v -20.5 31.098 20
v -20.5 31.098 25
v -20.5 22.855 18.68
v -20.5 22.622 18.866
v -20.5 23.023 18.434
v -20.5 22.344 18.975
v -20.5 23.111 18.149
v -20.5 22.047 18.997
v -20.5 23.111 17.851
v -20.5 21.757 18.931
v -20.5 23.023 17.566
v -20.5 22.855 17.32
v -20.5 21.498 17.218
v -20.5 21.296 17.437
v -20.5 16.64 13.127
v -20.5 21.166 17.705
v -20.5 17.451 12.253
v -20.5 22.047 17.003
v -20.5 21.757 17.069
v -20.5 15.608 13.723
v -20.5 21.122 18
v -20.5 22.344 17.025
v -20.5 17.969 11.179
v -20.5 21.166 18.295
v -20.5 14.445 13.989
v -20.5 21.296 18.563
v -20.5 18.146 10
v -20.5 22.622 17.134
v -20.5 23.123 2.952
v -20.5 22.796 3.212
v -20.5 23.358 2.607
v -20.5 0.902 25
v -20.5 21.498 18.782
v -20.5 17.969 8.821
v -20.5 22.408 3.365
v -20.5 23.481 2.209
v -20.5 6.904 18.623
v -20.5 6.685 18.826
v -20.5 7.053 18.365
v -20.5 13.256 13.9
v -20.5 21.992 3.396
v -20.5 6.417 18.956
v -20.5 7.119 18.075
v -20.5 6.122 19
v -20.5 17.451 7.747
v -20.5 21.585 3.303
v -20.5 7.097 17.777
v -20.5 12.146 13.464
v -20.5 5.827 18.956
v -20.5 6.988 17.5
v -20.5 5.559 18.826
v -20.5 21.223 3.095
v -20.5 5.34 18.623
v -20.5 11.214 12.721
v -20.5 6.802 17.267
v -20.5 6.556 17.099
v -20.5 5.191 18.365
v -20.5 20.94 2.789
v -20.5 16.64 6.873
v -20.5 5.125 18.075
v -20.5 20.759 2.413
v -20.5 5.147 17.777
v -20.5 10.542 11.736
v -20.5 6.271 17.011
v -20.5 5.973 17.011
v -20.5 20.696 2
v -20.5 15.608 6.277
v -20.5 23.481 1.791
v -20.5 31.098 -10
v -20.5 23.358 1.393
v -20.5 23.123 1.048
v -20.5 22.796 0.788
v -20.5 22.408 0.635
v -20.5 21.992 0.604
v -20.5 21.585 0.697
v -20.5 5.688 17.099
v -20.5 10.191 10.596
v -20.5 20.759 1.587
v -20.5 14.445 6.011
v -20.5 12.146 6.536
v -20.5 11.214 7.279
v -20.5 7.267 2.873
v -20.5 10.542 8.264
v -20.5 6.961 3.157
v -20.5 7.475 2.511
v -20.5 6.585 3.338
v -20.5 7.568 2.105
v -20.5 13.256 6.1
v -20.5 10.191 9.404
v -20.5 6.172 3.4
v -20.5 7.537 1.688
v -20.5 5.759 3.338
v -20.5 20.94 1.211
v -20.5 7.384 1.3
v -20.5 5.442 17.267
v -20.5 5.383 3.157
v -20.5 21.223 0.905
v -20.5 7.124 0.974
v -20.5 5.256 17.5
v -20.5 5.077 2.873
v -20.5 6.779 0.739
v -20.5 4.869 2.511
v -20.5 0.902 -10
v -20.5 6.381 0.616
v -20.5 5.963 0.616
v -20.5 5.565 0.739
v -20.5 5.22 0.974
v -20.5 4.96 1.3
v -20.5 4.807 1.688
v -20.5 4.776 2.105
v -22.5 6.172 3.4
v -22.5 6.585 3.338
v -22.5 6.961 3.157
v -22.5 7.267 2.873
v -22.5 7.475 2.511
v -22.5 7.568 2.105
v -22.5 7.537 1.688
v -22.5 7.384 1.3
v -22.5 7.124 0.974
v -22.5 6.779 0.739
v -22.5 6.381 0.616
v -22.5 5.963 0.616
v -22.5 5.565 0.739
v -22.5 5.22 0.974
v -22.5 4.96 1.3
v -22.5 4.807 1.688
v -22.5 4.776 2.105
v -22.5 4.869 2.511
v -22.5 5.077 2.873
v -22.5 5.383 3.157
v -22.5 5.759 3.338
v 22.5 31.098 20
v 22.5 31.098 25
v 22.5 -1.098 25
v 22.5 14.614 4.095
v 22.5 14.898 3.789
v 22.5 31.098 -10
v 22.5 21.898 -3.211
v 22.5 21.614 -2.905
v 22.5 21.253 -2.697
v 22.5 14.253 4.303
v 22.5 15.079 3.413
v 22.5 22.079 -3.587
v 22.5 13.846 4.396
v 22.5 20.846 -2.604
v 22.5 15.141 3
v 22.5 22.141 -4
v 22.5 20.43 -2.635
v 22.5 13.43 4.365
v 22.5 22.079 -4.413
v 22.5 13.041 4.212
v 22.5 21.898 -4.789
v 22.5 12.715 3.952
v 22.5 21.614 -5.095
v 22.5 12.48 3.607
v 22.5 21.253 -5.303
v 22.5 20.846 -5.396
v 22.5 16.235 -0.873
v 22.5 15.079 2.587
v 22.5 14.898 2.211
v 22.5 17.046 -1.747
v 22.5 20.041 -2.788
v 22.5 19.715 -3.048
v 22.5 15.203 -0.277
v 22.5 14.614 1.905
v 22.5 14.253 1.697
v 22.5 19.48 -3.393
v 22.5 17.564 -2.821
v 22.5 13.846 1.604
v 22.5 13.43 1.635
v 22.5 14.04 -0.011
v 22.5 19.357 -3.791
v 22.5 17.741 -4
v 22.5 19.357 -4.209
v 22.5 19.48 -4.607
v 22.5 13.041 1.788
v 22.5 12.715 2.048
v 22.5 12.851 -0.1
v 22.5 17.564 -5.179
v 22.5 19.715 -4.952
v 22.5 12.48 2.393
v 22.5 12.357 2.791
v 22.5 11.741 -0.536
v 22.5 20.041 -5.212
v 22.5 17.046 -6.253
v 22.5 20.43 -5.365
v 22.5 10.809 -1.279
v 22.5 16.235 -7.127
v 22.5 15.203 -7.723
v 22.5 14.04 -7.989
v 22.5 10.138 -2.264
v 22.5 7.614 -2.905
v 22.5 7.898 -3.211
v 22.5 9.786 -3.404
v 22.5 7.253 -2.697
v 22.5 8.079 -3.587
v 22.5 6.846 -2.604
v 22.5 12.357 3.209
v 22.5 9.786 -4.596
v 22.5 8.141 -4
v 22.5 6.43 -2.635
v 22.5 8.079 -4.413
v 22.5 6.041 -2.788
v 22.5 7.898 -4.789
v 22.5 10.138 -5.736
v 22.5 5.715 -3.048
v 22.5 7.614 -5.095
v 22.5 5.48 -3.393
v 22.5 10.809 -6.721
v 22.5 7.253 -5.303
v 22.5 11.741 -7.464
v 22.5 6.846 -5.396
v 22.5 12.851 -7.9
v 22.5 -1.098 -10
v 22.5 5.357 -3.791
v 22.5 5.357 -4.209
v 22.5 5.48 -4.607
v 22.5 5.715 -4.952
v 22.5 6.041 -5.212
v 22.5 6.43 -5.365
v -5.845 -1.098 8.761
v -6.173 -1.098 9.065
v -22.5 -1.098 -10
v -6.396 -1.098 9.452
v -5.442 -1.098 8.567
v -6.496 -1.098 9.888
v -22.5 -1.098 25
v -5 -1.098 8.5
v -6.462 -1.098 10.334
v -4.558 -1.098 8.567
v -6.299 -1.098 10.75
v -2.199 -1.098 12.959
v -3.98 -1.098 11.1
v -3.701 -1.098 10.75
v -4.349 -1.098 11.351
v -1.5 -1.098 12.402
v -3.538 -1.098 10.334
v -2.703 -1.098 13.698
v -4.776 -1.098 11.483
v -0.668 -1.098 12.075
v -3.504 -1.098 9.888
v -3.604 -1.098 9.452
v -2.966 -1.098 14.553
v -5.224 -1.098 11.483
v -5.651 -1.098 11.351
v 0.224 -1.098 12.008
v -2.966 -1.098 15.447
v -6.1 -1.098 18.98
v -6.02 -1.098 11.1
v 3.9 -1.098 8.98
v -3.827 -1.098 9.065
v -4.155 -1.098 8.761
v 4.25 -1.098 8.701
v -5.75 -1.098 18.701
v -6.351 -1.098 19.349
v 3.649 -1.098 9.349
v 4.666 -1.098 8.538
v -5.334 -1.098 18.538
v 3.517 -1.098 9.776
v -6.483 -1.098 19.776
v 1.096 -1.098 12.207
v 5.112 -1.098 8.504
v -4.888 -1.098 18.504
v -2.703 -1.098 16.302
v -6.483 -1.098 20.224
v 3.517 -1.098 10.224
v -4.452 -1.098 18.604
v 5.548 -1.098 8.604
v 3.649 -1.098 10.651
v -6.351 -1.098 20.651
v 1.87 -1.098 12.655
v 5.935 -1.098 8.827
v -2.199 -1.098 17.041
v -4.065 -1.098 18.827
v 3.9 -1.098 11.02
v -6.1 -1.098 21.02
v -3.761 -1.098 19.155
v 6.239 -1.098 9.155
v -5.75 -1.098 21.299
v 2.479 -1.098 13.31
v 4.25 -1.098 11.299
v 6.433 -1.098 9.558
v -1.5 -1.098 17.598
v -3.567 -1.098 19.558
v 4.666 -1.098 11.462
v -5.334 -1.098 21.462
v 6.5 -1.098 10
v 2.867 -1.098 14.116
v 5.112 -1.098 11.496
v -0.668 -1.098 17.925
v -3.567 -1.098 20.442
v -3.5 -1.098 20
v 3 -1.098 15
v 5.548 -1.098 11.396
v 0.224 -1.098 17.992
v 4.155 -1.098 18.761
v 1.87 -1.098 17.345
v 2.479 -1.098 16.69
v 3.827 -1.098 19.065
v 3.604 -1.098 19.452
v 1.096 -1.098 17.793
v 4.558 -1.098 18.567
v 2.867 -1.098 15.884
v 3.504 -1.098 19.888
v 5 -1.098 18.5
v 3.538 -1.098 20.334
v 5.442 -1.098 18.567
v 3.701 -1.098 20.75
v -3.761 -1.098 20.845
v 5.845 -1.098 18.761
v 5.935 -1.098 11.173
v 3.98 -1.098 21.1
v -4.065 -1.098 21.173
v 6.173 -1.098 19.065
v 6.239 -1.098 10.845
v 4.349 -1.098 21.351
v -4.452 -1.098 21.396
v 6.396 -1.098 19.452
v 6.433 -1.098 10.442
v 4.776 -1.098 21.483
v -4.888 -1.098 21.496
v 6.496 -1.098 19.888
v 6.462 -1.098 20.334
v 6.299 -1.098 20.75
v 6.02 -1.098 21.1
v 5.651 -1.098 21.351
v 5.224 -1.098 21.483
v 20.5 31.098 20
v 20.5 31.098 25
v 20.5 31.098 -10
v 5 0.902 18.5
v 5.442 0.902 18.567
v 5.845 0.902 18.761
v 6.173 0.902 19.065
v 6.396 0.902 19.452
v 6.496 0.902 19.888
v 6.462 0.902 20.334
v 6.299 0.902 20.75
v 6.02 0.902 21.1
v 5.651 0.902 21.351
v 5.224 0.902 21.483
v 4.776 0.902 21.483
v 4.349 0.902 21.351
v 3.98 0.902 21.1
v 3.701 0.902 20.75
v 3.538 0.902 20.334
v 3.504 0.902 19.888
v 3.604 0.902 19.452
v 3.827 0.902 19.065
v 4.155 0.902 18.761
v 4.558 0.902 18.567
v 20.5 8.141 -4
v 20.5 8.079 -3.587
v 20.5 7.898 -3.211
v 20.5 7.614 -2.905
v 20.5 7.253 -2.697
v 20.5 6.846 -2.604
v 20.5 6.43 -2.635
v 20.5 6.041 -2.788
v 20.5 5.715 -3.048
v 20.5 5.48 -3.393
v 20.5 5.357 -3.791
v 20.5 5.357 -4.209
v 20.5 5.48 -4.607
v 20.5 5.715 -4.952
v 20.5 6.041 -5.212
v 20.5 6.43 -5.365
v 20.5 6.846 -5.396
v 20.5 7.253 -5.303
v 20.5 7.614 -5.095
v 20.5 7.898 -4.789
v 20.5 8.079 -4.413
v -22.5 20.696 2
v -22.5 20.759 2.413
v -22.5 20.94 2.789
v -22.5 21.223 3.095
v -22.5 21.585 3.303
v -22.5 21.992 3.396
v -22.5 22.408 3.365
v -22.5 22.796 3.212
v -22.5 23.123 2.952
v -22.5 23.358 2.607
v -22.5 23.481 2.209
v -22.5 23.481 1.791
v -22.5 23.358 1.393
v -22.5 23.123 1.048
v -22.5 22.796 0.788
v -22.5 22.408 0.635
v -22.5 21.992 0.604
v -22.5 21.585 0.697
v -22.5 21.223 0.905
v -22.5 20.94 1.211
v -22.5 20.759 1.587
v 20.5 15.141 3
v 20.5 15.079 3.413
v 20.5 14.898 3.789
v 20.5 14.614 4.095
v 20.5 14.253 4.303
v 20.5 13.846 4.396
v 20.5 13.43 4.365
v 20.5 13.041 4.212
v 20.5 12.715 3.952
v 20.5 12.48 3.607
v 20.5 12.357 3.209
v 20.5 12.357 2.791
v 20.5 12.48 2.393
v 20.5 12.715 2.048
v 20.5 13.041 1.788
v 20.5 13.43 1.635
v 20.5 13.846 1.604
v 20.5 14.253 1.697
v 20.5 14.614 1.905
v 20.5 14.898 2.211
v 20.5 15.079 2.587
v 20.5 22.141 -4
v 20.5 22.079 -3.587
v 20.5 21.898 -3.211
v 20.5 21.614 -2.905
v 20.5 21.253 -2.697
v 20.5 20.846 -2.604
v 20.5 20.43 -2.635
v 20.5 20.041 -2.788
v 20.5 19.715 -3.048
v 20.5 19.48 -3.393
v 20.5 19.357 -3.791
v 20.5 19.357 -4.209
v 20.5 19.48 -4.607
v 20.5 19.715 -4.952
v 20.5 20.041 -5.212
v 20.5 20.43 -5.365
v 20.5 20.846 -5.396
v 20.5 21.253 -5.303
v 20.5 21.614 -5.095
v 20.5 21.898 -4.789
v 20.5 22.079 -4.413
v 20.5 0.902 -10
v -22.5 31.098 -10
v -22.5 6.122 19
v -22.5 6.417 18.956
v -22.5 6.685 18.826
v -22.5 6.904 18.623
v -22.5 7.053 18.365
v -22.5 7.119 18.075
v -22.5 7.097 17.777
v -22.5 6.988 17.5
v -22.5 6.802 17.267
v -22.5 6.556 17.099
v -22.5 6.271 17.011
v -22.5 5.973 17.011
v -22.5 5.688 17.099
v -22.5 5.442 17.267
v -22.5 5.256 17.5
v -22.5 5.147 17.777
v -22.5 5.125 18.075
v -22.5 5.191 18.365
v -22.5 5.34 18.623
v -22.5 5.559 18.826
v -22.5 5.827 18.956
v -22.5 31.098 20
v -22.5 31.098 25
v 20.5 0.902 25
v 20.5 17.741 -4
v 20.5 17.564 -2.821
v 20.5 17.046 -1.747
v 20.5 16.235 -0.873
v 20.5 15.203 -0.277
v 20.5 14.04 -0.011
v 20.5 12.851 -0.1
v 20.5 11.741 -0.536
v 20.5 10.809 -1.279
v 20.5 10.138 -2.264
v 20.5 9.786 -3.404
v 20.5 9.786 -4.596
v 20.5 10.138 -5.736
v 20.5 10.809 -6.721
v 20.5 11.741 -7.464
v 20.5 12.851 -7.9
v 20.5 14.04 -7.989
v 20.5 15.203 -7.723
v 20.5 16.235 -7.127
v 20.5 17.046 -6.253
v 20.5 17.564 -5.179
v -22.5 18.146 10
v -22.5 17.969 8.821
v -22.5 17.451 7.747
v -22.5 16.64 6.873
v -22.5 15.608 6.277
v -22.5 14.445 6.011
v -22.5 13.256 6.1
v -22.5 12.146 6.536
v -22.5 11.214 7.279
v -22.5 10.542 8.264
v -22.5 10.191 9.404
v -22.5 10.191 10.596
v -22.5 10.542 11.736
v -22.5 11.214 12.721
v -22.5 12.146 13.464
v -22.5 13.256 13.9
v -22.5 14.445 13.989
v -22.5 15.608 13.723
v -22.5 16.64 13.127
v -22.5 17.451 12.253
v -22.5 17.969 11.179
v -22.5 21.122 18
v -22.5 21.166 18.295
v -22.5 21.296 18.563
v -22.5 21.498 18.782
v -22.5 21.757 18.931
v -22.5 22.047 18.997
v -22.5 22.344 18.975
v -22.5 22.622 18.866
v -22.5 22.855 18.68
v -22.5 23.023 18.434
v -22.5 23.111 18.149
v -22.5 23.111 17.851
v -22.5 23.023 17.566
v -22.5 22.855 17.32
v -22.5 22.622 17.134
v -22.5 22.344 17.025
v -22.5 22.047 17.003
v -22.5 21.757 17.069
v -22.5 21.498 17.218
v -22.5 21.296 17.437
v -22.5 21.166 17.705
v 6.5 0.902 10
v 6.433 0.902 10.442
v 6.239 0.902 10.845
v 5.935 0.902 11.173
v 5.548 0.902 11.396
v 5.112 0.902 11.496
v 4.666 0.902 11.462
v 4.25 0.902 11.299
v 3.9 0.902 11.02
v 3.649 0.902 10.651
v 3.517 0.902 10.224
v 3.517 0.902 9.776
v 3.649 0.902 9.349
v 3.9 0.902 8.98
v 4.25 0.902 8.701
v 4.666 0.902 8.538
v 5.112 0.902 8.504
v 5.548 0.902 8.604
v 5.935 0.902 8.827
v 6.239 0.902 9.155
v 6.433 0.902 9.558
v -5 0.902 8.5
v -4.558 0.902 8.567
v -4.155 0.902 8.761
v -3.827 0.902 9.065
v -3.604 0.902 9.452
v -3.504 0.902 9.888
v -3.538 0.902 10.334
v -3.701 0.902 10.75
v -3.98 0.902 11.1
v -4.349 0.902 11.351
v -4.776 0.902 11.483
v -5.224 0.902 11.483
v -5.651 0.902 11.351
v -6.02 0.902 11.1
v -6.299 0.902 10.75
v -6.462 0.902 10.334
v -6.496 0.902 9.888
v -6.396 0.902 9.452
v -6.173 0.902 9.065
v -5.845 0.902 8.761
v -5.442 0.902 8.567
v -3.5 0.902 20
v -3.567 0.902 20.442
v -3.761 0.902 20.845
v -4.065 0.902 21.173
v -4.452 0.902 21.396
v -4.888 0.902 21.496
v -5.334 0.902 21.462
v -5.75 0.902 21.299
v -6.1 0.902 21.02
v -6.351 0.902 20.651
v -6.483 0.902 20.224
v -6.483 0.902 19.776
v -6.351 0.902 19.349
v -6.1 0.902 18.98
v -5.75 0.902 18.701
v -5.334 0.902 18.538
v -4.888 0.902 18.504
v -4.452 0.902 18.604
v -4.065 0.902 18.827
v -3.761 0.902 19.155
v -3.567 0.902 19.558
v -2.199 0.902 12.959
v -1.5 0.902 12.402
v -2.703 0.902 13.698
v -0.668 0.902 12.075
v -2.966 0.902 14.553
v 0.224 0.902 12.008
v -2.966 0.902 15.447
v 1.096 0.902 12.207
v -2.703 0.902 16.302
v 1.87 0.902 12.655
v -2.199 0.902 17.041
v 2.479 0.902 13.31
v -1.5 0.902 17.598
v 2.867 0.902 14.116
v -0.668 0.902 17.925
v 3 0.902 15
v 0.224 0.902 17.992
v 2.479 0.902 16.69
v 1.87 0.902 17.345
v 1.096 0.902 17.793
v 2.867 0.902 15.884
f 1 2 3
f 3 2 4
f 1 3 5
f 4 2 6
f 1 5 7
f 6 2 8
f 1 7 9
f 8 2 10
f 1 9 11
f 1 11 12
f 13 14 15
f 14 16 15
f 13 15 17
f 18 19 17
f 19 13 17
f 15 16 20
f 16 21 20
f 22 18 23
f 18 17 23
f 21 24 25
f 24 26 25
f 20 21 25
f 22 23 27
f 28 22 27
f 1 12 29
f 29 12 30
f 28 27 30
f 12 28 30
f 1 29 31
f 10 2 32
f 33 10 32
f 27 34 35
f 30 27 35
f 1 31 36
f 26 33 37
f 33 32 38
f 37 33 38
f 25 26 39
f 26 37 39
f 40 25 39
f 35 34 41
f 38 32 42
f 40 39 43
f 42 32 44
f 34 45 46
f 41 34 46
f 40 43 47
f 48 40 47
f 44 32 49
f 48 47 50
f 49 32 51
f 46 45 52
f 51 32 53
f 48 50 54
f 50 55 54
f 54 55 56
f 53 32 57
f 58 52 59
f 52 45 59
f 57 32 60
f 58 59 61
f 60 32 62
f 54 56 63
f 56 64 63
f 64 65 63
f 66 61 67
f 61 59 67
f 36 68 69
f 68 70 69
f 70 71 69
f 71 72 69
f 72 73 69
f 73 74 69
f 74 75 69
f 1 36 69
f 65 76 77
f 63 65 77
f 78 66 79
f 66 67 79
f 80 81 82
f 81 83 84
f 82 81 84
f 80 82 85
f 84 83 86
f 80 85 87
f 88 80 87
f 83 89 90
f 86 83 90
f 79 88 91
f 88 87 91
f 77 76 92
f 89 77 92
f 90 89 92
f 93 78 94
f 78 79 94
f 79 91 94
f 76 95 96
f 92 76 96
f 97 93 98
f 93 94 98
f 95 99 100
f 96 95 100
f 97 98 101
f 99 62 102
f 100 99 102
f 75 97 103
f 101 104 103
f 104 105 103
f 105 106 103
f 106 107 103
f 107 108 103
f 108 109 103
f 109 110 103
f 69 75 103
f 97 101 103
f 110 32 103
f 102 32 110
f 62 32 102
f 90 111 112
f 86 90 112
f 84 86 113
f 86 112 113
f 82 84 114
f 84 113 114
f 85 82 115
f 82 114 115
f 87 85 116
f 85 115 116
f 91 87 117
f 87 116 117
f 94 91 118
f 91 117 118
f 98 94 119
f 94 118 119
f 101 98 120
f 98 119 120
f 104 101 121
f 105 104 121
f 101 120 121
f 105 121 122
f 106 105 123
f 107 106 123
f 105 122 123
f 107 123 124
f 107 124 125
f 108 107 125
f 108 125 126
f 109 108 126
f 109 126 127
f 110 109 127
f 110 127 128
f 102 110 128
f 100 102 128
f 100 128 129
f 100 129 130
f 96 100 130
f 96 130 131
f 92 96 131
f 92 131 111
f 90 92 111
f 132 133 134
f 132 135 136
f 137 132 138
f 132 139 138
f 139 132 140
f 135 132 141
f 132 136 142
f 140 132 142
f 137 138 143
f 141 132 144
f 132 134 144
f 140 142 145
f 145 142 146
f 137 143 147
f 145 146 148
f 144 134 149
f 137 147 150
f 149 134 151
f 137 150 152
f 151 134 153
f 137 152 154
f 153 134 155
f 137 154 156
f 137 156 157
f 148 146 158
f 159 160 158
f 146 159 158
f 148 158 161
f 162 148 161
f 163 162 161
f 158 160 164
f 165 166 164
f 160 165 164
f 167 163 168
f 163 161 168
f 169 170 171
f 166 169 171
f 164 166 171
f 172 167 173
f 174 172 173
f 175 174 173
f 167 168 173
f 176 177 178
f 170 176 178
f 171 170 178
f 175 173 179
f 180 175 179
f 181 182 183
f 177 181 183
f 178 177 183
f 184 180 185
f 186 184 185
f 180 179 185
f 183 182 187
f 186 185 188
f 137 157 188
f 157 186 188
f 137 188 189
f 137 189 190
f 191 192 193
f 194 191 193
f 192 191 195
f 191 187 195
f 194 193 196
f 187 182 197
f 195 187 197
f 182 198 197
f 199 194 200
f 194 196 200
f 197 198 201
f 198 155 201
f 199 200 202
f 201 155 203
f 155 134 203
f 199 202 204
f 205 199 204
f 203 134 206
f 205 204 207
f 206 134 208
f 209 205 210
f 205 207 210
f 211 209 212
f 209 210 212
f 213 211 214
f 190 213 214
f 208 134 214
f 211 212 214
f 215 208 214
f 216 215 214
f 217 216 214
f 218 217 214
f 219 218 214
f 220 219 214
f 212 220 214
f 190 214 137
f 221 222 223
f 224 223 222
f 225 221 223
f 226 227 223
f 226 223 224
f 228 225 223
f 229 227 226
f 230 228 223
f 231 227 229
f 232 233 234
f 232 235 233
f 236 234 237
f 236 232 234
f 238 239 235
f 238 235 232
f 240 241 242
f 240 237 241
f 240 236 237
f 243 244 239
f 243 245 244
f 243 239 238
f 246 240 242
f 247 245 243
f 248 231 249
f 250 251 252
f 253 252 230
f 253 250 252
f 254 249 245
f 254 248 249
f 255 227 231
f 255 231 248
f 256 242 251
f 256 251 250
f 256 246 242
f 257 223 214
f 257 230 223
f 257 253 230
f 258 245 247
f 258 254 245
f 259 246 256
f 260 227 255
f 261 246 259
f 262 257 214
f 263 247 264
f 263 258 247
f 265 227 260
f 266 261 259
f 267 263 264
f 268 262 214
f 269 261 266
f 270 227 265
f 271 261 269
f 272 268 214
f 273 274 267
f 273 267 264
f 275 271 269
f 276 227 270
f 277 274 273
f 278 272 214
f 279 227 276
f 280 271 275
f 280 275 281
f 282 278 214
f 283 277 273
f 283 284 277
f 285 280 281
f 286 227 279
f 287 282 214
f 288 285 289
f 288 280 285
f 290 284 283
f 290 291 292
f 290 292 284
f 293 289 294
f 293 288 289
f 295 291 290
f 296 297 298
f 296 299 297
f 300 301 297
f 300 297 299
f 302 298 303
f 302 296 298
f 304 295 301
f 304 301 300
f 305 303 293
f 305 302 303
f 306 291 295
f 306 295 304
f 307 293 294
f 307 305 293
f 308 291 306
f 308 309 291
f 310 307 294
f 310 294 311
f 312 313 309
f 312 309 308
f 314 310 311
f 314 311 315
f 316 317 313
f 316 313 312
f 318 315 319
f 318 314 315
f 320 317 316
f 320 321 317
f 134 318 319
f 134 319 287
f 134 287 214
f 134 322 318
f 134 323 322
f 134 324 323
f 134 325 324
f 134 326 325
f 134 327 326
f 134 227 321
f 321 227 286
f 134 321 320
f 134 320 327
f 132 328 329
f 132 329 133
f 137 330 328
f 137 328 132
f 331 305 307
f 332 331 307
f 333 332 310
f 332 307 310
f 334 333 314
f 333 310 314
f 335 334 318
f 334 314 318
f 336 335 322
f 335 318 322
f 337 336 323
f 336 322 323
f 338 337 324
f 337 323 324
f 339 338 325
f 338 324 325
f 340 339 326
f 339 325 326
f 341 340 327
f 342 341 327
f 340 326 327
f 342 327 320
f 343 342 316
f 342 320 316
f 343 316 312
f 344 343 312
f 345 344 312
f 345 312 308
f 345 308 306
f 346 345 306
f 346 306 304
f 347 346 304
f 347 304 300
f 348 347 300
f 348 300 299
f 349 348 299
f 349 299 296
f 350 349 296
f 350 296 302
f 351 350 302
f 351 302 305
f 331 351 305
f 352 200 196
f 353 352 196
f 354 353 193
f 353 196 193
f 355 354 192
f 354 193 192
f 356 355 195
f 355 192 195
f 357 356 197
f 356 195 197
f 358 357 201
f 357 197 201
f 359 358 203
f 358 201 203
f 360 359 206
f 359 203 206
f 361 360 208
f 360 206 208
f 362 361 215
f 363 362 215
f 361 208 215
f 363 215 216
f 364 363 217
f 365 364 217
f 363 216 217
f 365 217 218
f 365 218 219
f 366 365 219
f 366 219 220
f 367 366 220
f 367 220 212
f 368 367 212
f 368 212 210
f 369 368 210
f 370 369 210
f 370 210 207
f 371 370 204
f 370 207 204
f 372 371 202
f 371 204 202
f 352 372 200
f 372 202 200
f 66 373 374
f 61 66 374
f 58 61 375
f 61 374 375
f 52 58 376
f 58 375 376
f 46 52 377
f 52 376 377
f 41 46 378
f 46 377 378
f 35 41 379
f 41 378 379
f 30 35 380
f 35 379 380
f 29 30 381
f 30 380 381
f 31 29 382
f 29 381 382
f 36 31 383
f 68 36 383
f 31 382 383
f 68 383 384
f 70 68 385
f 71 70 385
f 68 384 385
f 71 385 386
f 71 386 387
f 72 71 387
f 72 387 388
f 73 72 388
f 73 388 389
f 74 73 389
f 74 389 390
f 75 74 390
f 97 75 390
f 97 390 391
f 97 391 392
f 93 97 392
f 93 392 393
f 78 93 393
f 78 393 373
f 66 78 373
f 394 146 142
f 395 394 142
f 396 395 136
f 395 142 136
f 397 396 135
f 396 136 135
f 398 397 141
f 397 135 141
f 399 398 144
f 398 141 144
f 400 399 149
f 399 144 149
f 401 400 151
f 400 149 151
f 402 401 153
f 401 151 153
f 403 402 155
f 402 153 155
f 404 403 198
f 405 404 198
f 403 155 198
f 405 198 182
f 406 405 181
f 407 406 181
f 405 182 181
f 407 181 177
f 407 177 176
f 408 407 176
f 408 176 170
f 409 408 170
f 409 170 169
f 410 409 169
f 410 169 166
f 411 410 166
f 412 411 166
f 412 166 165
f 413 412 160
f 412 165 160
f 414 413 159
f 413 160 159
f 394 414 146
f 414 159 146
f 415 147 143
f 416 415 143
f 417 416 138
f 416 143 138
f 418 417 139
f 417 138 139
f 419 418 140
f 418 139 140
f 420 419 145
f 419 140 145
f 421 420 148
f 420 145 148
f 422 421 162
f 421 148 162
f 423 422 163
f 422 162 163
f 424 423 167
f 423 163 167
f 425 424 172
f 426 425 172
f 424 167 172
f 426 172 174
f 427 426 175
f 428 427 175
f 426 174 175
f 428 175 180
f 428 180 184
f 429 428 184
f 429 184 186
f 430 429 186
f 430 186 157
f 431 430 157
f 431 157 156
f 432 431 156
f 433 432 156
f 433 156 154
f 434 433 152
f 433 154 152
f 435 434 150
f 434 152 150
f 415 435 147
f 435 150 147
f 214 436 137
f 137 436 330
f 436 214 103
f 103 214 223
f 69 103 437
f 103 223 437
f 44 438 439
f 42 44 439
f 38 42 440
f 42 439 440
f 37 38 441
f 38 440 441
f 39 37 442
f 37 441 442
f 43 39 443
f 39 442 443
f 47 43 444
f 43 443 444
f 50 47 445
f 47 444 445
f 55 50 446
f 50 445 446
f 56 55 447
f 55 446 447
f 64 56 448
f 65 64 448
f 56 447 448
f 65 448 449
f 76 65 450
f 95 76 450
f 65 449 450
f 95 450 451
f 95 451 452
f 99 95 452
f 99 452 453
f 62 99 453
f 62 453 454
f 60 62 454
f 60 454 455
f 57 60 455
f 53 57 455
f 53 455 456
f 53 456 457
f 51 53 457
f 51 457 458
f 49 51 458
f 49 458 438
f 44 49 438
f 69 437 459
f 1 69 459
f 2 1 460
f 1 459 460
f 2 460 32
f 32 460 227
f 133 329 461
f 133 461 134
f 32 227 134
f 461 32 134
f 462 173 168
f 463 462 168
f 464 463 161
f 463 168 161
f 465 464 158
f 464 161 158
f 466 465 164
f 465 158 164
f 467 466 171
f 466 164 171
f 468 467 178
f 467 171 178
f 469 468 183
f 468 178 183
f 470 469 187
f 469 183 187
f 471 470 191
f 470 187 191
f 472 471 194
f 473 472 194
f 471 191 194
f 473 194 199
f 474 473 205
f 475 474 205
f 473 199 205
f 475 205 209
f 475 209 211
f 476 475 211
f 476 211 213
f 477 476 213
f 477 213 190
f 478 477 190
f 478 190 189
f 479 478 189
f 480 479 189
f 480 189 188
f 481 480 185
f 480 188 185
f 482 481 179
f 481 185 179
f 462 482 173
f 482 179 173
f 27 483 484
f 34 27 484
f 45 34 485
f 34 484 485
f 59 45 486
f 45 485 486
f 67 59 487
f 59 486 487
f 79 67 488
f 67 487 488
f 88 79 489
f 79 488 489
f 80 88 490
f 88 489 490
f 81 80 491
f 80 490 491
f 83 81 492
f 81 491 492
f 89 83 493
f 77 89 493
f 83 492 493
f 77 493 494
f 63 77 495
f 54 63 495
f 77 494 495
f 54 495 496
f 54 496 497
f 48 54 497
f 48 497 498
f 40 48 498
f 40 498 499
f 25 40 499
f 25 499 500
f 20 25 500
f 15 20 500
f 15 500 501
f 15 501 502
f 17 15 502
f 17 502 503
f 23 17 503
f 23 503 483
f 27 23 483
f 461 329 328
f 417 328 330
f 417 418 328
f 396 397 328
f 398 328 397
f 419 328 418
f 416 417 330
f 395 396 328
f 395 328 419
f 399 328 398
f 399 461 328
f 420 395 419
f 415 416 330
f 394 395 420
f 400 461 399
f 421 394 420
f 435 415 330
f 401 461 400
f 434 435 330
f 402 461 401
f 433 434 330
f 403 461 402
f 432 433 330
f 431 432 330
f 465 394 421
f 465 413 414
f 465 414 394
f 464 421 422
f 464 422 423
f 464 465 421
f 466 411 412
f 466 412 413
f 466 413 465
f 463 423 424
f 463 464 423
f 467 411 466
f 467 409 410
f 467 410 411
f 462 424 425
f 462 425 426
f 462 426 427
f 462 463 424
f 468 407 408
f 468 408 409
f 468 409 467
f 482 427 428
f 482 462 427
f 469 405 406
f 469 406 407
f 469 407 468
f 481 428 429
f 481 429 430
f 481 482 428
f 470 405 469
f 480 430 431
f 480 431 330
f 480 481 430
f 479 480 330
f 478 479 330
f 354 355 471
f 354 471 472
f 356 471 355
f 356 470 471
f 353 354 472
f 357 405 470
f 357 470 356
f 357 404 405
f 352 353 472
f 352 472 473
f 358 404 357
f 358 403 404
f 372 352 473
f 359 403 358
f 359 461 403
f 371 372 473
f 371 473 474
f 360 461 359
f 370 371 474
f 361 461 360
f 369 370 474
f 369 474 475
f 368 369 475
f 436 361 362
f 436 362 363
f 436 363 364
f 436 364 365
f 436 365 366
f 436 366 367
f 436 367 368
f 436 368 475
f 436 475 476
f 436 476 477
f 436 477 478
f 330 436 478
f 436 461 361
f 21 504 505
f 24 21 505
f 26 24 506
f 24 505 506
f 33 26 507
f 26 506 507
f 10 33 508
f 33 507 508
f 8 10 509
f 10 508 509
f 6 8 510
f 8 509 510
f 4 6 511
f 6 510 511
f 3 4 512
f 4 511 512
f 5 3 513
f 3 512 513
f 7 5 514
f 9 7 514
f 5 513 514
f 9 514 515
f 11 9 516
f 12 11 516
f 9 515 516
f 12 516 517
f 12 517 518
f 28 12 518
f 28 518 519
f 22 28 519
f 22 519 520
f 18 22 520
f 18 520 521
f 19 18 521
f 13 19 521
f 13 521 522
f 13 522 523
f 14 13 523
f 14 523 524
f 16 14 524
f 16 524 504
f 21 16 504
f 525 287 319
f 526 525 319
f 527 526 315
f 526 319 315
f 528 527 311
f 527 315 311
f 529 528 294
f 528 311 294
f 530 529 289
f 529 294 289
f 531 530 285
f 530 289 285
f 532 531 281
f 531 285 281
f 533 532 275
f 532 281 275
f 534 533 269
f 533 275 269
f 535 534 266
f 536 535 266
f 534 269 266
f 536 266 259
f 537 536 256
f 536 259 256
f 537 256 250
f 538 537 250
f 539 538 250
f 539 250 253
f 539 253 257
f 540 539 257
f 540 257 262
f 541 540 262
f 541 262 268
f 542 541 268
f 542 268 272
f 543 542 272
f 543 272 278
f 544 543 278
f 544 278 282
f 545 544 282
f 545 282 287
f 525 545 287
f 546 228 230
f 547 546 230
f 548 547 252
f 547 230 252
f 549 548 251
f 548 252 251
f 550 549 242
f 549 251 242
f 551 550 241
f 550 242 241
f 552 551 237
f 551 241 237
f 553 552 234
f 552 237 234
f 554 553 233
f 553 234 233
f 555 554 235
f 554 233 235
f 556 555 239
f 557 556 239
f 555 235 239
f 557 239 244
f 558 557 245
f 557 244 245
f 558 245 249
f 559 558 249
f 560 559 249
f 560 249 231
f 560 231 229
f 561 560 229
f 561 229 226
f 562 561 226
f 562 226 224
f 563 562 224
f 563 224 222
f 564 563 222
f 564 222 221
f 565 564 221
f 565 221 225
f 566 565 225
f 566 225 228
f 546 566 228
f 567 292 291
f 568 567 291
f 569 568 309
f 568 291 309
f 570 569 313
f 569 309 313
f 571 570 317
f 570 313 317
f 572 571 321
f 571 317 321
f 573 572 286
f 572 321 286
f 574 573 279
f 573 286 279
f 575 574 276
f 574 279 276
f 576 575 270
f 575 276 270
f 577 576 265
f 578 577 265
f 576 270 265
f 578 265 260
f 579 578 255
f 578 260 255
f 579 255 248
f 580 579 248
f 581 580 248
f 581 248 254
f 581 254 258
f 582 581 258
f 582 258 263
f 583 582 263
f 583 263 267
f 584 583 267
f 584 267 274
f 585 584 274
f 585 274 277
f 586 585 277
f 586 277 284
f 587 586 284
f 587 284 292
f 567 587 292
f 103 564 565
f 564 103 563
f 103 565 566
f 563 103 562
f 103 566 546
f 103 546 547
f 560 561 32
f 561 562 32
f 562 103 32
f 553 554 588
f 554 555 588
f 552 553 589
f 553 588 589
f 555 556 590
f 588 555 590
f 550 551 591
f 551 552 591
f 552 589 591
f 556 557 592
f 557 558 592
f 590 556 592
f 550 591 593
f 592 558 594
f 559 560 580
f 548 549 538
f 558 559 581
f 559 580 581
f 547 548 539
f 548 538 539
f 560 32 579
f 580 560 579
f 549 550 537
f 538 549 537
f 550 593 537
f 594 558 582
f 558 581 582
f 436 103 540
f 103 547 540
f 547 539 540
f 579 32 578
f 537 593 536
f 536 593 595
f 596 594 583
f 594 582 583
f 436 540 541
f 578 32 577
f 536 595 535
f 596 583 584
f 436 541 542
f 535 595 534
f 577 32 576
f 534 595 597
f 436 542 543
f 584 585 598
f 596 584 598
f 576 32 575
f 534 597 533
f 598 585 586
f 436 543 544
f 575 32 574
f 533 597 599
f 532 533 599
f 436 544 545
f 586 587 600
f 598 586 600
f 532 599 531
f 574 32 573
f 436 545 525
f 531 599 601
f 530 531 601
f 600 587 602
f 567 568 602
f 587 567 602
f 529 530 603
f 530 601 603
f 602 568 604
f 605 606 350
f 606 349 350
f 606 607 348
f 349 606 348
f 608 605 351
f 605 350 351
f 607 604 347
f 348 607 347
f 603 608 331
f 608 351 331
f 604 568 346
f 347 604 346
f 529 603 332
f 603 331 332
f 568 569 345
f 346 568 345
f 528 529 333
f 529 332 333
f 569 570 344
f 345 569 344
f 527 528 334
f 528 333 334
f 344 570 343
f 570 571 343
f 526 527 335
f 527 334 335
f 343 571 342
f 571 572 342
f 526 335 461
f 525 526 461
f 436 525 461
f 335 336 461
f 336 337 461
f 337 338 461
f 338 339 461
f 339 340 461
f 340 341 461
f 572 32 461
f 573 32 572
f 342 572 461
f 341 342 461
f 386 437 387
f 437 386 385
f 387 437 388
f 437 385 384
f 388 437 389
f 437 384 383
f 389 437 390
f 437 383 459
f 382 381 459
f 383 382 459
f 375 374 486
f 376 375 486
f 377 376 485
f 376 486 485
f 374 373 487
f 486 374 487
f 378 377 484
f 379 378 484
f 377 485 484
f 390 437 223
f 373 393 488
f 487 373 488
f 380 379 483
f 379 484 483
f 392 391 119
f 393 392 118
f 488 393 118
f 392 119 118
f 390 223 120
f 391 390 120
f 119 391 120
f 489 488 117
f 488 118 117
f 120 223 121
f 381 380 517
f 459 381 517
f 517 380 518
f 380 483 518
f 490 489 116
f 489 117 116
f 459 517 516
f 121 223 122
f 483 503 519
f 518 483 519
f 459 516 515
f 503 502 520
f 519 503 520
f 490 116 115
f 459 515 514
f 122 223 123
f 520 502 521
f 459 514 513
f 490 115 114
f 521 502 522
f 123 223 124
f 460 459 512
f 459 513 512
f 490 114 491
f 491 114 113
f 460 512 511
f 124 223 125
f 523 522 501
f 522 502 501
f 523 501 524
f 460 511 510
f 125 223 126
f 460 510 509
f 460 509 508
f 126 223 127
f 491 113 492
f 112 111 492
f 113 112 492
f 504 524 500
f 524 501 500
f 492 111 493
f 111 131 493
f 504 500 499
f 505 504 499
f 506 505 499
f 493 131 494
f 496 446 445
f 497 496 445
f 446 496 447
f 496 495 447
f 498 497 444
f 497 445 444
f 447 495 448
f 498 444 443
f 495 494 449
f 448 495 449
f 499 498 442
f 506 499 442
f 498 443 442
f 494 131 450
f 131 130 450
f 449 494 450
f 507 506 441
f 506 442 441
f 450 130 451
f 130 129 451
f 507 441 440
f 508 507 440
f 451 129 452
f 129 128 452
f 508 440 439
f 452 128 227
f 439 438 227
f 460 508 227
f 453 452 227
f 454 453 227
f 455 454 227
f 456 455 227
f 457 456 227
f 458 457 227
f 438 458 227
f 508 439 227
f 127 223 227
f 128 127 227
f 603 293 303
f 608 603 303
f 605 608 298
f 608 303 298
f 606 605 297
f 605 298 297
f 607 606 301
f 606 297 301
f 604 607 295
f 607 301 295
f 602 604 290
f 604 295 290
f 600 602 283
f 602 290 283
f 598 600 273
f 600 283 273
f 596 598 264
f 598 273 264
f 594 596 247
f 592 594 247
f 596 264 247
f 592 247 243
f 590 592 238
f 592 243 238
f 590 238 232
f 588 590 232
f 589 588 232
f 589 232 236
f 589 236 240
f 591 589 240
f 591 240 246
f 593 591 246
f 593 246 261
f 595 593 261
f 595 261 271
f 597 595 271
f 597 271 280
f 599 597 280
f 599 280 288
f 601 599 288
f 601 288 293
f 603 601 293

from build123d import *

# Parameters (mm, degrees)
EXTRUDE_1_DEPTH                 = 20
CUT_EXTRUDE_1_REACH             = 60.241
SKETCH_2_R                      = 4
CUT_EXTRUDE_1_DIRECTION_2_DEPTH = 59.241379608
CUT_EXTRUDE_2_REACH             = 60.241
SKETCH_3_R                      = 1.4
SKETCH_3_R_2                    = 1
SKETCH_7_W                      = 10
SKETCH_7_H                      = 32.195121952
EXTRUDE_2_DEPTH                 = 2
SKETCH_8_W                      = 43
SKETCH_8_H                      = 10
EXTRUDE_3_DEPTH                 = 2
SKETCH_9_W                      = 10
SKETCH_9_H                      = 30.195121952
EXTRUDE_4_DEPTH                 = 2
SKETCH_11_R                     = 1.4
SKETCH_11_R_2                   = 4
CUT_EXTRUDE_8_DEPTH             = 2
SKETCH_13_W                     = 45
SKETCH_13_H                     = 5
EXTRUDE_5_DEPTH                 = 2
SKETCH_14_W                     = 2
SKETCH_14_H                     = 5
EXTRUDE_6_DEPTH                 = 30.19512195
CUT_EXTRUDE_9_REACH             = 48.559
SKETCH_19_R                     = 1.5
SKETCH_19_R_2                   = 3


with BuildPart() as part:
    # 草图1 → 凸台-拉伸1 (new body)
    with BuildSketch(Plane.XY):
        Polygon((22.5, 1.097560976), (22.5, -1.097560976), (-22.5, -1.097560976), (-22.5, 1.097560976), (-22.5, 31.097560976), (-20.5, 31.097560976), (-20.5, 0.902439024), (20.5, 0.902439024), (20.5, 31.097560976), (22.5, 31.097560976), align=None)
    extrude(amount=EXTRUDE_1_DEPTH)

    # 草图2 → 切除-拉伸1 (cut, up to next)
    with BuildSketch(Plane.ZY.offset(22.5), mode=Mode.PRIVATE) as cut_extrude_1_sk1:
        with Locations(Location((10, 14.146341463, 0), (0, 0, 90))):
            Circle(SKETCH_2_R)
    cut_extrude_1_tool1 = extrude(cut_extrude_1_sk1.sketch, amount=-CUT_EXTRUDE_1_REACH, mode=Mode.PRIVATE) & part.part
    add(cut_extrude_1_tool1.solids().sort_by_distance((-22.5, 14.146341, 10))[0], mode=Mode.SUBTRACT)

    # 草图2 → 切除-拉伸1 direction 2 (cut)
    with BuildSketch(Plane.ZY.offset(22.5)):
        with Locations(Location((10, 14.146341463, 0), (0, 0, 90))):
            Circle(SKETCH_2_R)
    extrude(amount=CUT_EXTRUDE_1_DIRECTION_2_DEPTH, mode=Mode.SUBTRACT)

    # 草图3 → 切除-拉伸2 (cut, up to next)
    with BuildSketch(Plane.ZY.offset(22.5), mode=Mode.PRIVATE) as cut_extrude_2_sk1:
        with Locations(Location((2, 22.096341464, 0), (0, 0, 270))):
            Circle(SKETCH_3_R)
    cut_extrude_2_tool1 = extrude(cut_extrude_2_sk1.sketch, amount=-CUT_EXTRUDE_2_REACH, mode=Mode.PRIVATE) & part.part
    # 草图3 → 切除-拉伸2 (cut, up to next)
    with BuildSketch(Plane.ZY.offset(22.5), mode=Mode.PRIVATE) as cut_extrude_2_sk2:
        with Locations(Location((18, 22.12195122, 0), (0, 0, 270))):
            Circle(SKETCH_3_R_2)
    cut_extrude_2_tool2 = extrude(cut_extrude_2_sk2.sketch, amount=-CUT_EXTRUDE_2_REACH, mode=Mode.PRIVATE) & part.part
    # 草图3 → 切除-拉伸2 (cut, up to next)
    with BuildSketch(Plane.ZY.offset(22.5), mode=Mode.PRIVATE) as cut_extrude_2_sk3:
        with Locations((18, 6.12195122)):
            Circle(SKETCH_3_R_2)
    cut_extrude_2_tool3 = extrude(cut_extrude_2_sk3.sketch, amount=-CUT_EXTRUDE_2_REACH, mode=Mode.PRIVATE) & part.part
    # 草图3 → 切除-拉伸2 (cut, up to next)
    with BuildSketch(Plane.ZY.offset(22.5), mode=Mode.PRIVATE) as cut_extrude_2_sk4:
        with Locations((2, 6.171951224)):
            Circle(SKETCH_3_R)
    cut_extrude_2_tool4 = extrude(cut_extrude_2_sk4.sketch, amount=-CUT_EXTRUDE_2_REACH, mode=Mode.PRIVATE) & part.part
    add(cut_extrude_2_tool1.solids().sort_by_distance((-22.5, 22.096341, 2))[0], mode=Mode.SUBTRACT)
    add(cut_extrude_2_tool2.solids().sort_by_distance((-22.5, 22.121951, 18))[0], mode=Mode.SUBTRACT)
    add(cut_extrude_2_tool3.solids().sort_by_distance((-22.5, 6.121951, 18))[0], mode=Mode.SUBTRACT)
    add(cut_extrude_2_tool4.solids().sort_by_distance((-22.5, 6.171951, 2))[0], mode=Mode.SUBTRACT)

    # 草图7 → 凸台-拉伸2 (add)
    with BuildSketch(Plane(origin=(22.5, 0, 0), x_dir=(0, 0, -1), z_dir=(1, 0, 0))):
        with Locations((5, 15)):
            Rectangle(SKETCH_7_W, SKETCH_7_H)
    extrude(amount=-EXTRUDE_2_DEPTH)

    # 草图8 → 凸台-拉伸3 (add)
    with BuildSketch(Plane.XZ.offset(1.097560976)):
        with Locations((-1, -5)):
            Rectangle(SKETCH_8_W, SKETCH_8_H)
    extrude(amount=-EXTRUDE_3_DEPTH)

    # 草图9 → 凸台-拉伸4 (add)
    with BuildSketch(Plane.ZY.offset(22.5)):
        with Locations((-5, 16)):
            Rectangle(SKETCH_9_W, SKETCH_9_H)
    extrude(amount=-EXTRUDE_4_DEPTH)

    # 草图11 → 切除-拉伸8 (cut)
    with BuildSketch(Plane(origin=(22.5, 0, 0), x_dir=(0, 0, -1), z_dir=(1, 0, 0))):
        with Locations(Location((4, 20.741461029, 0), (0, 0, 90))):
            Circle(SKETCH_11_R)
        with Locations(Location((4, 6.741461029, 0), (0, 0, 90))):
            Circle(SKETCH_11_R)
        with Locations(Location((-3, 13.741461029, 0), (0, 0, 90))):
            Circle(SKETCH_11_R)
        with Locations(Location((4, 13.741461029, 0), (0, 0, 90))):
            Circle(SKETCH_11_R_2)
    extrude(amount=-CUT_EXTRUDE_8_DEPTH, mode=Mode.SUBTRACT)

    # 草图13 → 凸台-拉伸5 (add)
    with BuildSketch(Plane.XZ.offset(1.097560976)):
        with Locations((0, 22.5)):
            Rectangle(SKETCH_13_W, SKETCH_13_H)
    extrude(amount=-EXTRUDE_5_DEPTH)

    # 草图14 → 凸台-拉伸6 (add)
    with BuildSketch(Plane(origin=(0, 0.902439024, 0), x_dir=(1, 0, 0), z_dir=(0, 1, 0))):
        with Locations((21.5, -22.5)):
            Rectangle(SKETCH_14_W, SKETCH_14_H)
        with Locations((-21.5, -22.5)):
            Rectangle(SKETCH_14_W, SKETCH_14_H)
    extrude(amount=EXTRUDE_6_DEPTH)

    # 草图19 → 切除-拉伸9 (cut, up to next)
    with BuildSketch(Plane.XZ.offset(1.097560976), mode=Mode.PRIVATE) as cut_extrude_9_sk1:
        with Locations((-5, 20)):
            Circle(SKETCH_19_R)
    cut_extrude_9_tool1 = extrude(cut_extrude_9_sk1.sketch, amount=-CUT_EXTRUDE_9_REACH, mode=Mode.PRIVATE) & part.part
    # 草图19 → 切除-拉伸9 (cut, up to next)
    with BuildSketch(Plane.XZ.offset(1.097560976), mode=Mode.PRIVATE) as cut_extrude_9_sk2:
        with Locations((0, 15)):
            Circle(SKETCH_19_R_2)
    cut_extrude_9_tool2 = extrude(cut_extrude_9_sk2.sketch, amount=-CUT_EXTRUDE_9_REACH, mode=Mode.PRIVATE) & part.part
    # 草图19 → 切除-拉伸9 (cut, up to next)
    with BuildSketch(Plane.XZ.offset(1.097560976), mode=Mode.PRIVATE) as cut_extrude_9_sk3:
        with Locations(Location((-5, 10, 0), (0, 0, 270))):
            Circle(SKETCH_19_R)
    cut_extrude_9_tool3 = extrude(cut_extrude_9_sk3.sketch, amount=-CUT_EXTRUDE_9_REACH, mode=Mode.PRIVATE) & part.part
    # 草图19 → 切除-拉伸9 (cut, up to next)
    with BuildSketch(Plane.XZ.offset(1.097560976), mode=Mode.PRIVATE) as cut_extrude_9_sk4:
        with Locations((5, 10)):
            Circle(SKETCH_19_R)
    cut_extrude_9_tool4 = extrude(cut_extrude_9_sk4.sketch, amount=-CUT_EXTRUDE_9_REACH, mode=Mode.PRIVATE) & part.part
    # 草图19 → 切除-拉伸9 (cut, up to next)
    with BuildSketch(Plane.XZ.offset(1.097560976), mode=Mode.PRIVATE) as cut_extrude_9_sk5:
        with Locations(Location((5, 20, 0), (0, 0, 270))):
            Circle(SKETCH_19_R)
    cut_extrude_9_tool5 = extrude(cut_extrude_9_sk5.sketch, amount=-CUT_EXTRUDE_9_REACH, mode=Mode.PRIVATE) & part.part
    add(cut_extrude_9_tool1.solids().sort_by_distance((-5, -1.097561, 20))[0], mode=Mode.SUBTRACT)
    add(cut_extrude_9_tool2.solids().sort_by_distance((0, -1.097561, 15))[0], mode=Mode.SUBTRACT)
    add(cut_extrude_9_tool3.solids().sort_by_distance((-5, -1.097561, 10))[0], mode=Mode.SUBTRACT)
    add(cut_extrude_9_tool4.solids().sort_by_distance((5, -1.097561, 10))[0], mode=Mode.SUBTRACT)
    add(cut_extrude_9_tool5.solids().sort_by_distance((5, -1.097561, 20))[0], mode=Mode.SUBTRACT)


solid = part.part
